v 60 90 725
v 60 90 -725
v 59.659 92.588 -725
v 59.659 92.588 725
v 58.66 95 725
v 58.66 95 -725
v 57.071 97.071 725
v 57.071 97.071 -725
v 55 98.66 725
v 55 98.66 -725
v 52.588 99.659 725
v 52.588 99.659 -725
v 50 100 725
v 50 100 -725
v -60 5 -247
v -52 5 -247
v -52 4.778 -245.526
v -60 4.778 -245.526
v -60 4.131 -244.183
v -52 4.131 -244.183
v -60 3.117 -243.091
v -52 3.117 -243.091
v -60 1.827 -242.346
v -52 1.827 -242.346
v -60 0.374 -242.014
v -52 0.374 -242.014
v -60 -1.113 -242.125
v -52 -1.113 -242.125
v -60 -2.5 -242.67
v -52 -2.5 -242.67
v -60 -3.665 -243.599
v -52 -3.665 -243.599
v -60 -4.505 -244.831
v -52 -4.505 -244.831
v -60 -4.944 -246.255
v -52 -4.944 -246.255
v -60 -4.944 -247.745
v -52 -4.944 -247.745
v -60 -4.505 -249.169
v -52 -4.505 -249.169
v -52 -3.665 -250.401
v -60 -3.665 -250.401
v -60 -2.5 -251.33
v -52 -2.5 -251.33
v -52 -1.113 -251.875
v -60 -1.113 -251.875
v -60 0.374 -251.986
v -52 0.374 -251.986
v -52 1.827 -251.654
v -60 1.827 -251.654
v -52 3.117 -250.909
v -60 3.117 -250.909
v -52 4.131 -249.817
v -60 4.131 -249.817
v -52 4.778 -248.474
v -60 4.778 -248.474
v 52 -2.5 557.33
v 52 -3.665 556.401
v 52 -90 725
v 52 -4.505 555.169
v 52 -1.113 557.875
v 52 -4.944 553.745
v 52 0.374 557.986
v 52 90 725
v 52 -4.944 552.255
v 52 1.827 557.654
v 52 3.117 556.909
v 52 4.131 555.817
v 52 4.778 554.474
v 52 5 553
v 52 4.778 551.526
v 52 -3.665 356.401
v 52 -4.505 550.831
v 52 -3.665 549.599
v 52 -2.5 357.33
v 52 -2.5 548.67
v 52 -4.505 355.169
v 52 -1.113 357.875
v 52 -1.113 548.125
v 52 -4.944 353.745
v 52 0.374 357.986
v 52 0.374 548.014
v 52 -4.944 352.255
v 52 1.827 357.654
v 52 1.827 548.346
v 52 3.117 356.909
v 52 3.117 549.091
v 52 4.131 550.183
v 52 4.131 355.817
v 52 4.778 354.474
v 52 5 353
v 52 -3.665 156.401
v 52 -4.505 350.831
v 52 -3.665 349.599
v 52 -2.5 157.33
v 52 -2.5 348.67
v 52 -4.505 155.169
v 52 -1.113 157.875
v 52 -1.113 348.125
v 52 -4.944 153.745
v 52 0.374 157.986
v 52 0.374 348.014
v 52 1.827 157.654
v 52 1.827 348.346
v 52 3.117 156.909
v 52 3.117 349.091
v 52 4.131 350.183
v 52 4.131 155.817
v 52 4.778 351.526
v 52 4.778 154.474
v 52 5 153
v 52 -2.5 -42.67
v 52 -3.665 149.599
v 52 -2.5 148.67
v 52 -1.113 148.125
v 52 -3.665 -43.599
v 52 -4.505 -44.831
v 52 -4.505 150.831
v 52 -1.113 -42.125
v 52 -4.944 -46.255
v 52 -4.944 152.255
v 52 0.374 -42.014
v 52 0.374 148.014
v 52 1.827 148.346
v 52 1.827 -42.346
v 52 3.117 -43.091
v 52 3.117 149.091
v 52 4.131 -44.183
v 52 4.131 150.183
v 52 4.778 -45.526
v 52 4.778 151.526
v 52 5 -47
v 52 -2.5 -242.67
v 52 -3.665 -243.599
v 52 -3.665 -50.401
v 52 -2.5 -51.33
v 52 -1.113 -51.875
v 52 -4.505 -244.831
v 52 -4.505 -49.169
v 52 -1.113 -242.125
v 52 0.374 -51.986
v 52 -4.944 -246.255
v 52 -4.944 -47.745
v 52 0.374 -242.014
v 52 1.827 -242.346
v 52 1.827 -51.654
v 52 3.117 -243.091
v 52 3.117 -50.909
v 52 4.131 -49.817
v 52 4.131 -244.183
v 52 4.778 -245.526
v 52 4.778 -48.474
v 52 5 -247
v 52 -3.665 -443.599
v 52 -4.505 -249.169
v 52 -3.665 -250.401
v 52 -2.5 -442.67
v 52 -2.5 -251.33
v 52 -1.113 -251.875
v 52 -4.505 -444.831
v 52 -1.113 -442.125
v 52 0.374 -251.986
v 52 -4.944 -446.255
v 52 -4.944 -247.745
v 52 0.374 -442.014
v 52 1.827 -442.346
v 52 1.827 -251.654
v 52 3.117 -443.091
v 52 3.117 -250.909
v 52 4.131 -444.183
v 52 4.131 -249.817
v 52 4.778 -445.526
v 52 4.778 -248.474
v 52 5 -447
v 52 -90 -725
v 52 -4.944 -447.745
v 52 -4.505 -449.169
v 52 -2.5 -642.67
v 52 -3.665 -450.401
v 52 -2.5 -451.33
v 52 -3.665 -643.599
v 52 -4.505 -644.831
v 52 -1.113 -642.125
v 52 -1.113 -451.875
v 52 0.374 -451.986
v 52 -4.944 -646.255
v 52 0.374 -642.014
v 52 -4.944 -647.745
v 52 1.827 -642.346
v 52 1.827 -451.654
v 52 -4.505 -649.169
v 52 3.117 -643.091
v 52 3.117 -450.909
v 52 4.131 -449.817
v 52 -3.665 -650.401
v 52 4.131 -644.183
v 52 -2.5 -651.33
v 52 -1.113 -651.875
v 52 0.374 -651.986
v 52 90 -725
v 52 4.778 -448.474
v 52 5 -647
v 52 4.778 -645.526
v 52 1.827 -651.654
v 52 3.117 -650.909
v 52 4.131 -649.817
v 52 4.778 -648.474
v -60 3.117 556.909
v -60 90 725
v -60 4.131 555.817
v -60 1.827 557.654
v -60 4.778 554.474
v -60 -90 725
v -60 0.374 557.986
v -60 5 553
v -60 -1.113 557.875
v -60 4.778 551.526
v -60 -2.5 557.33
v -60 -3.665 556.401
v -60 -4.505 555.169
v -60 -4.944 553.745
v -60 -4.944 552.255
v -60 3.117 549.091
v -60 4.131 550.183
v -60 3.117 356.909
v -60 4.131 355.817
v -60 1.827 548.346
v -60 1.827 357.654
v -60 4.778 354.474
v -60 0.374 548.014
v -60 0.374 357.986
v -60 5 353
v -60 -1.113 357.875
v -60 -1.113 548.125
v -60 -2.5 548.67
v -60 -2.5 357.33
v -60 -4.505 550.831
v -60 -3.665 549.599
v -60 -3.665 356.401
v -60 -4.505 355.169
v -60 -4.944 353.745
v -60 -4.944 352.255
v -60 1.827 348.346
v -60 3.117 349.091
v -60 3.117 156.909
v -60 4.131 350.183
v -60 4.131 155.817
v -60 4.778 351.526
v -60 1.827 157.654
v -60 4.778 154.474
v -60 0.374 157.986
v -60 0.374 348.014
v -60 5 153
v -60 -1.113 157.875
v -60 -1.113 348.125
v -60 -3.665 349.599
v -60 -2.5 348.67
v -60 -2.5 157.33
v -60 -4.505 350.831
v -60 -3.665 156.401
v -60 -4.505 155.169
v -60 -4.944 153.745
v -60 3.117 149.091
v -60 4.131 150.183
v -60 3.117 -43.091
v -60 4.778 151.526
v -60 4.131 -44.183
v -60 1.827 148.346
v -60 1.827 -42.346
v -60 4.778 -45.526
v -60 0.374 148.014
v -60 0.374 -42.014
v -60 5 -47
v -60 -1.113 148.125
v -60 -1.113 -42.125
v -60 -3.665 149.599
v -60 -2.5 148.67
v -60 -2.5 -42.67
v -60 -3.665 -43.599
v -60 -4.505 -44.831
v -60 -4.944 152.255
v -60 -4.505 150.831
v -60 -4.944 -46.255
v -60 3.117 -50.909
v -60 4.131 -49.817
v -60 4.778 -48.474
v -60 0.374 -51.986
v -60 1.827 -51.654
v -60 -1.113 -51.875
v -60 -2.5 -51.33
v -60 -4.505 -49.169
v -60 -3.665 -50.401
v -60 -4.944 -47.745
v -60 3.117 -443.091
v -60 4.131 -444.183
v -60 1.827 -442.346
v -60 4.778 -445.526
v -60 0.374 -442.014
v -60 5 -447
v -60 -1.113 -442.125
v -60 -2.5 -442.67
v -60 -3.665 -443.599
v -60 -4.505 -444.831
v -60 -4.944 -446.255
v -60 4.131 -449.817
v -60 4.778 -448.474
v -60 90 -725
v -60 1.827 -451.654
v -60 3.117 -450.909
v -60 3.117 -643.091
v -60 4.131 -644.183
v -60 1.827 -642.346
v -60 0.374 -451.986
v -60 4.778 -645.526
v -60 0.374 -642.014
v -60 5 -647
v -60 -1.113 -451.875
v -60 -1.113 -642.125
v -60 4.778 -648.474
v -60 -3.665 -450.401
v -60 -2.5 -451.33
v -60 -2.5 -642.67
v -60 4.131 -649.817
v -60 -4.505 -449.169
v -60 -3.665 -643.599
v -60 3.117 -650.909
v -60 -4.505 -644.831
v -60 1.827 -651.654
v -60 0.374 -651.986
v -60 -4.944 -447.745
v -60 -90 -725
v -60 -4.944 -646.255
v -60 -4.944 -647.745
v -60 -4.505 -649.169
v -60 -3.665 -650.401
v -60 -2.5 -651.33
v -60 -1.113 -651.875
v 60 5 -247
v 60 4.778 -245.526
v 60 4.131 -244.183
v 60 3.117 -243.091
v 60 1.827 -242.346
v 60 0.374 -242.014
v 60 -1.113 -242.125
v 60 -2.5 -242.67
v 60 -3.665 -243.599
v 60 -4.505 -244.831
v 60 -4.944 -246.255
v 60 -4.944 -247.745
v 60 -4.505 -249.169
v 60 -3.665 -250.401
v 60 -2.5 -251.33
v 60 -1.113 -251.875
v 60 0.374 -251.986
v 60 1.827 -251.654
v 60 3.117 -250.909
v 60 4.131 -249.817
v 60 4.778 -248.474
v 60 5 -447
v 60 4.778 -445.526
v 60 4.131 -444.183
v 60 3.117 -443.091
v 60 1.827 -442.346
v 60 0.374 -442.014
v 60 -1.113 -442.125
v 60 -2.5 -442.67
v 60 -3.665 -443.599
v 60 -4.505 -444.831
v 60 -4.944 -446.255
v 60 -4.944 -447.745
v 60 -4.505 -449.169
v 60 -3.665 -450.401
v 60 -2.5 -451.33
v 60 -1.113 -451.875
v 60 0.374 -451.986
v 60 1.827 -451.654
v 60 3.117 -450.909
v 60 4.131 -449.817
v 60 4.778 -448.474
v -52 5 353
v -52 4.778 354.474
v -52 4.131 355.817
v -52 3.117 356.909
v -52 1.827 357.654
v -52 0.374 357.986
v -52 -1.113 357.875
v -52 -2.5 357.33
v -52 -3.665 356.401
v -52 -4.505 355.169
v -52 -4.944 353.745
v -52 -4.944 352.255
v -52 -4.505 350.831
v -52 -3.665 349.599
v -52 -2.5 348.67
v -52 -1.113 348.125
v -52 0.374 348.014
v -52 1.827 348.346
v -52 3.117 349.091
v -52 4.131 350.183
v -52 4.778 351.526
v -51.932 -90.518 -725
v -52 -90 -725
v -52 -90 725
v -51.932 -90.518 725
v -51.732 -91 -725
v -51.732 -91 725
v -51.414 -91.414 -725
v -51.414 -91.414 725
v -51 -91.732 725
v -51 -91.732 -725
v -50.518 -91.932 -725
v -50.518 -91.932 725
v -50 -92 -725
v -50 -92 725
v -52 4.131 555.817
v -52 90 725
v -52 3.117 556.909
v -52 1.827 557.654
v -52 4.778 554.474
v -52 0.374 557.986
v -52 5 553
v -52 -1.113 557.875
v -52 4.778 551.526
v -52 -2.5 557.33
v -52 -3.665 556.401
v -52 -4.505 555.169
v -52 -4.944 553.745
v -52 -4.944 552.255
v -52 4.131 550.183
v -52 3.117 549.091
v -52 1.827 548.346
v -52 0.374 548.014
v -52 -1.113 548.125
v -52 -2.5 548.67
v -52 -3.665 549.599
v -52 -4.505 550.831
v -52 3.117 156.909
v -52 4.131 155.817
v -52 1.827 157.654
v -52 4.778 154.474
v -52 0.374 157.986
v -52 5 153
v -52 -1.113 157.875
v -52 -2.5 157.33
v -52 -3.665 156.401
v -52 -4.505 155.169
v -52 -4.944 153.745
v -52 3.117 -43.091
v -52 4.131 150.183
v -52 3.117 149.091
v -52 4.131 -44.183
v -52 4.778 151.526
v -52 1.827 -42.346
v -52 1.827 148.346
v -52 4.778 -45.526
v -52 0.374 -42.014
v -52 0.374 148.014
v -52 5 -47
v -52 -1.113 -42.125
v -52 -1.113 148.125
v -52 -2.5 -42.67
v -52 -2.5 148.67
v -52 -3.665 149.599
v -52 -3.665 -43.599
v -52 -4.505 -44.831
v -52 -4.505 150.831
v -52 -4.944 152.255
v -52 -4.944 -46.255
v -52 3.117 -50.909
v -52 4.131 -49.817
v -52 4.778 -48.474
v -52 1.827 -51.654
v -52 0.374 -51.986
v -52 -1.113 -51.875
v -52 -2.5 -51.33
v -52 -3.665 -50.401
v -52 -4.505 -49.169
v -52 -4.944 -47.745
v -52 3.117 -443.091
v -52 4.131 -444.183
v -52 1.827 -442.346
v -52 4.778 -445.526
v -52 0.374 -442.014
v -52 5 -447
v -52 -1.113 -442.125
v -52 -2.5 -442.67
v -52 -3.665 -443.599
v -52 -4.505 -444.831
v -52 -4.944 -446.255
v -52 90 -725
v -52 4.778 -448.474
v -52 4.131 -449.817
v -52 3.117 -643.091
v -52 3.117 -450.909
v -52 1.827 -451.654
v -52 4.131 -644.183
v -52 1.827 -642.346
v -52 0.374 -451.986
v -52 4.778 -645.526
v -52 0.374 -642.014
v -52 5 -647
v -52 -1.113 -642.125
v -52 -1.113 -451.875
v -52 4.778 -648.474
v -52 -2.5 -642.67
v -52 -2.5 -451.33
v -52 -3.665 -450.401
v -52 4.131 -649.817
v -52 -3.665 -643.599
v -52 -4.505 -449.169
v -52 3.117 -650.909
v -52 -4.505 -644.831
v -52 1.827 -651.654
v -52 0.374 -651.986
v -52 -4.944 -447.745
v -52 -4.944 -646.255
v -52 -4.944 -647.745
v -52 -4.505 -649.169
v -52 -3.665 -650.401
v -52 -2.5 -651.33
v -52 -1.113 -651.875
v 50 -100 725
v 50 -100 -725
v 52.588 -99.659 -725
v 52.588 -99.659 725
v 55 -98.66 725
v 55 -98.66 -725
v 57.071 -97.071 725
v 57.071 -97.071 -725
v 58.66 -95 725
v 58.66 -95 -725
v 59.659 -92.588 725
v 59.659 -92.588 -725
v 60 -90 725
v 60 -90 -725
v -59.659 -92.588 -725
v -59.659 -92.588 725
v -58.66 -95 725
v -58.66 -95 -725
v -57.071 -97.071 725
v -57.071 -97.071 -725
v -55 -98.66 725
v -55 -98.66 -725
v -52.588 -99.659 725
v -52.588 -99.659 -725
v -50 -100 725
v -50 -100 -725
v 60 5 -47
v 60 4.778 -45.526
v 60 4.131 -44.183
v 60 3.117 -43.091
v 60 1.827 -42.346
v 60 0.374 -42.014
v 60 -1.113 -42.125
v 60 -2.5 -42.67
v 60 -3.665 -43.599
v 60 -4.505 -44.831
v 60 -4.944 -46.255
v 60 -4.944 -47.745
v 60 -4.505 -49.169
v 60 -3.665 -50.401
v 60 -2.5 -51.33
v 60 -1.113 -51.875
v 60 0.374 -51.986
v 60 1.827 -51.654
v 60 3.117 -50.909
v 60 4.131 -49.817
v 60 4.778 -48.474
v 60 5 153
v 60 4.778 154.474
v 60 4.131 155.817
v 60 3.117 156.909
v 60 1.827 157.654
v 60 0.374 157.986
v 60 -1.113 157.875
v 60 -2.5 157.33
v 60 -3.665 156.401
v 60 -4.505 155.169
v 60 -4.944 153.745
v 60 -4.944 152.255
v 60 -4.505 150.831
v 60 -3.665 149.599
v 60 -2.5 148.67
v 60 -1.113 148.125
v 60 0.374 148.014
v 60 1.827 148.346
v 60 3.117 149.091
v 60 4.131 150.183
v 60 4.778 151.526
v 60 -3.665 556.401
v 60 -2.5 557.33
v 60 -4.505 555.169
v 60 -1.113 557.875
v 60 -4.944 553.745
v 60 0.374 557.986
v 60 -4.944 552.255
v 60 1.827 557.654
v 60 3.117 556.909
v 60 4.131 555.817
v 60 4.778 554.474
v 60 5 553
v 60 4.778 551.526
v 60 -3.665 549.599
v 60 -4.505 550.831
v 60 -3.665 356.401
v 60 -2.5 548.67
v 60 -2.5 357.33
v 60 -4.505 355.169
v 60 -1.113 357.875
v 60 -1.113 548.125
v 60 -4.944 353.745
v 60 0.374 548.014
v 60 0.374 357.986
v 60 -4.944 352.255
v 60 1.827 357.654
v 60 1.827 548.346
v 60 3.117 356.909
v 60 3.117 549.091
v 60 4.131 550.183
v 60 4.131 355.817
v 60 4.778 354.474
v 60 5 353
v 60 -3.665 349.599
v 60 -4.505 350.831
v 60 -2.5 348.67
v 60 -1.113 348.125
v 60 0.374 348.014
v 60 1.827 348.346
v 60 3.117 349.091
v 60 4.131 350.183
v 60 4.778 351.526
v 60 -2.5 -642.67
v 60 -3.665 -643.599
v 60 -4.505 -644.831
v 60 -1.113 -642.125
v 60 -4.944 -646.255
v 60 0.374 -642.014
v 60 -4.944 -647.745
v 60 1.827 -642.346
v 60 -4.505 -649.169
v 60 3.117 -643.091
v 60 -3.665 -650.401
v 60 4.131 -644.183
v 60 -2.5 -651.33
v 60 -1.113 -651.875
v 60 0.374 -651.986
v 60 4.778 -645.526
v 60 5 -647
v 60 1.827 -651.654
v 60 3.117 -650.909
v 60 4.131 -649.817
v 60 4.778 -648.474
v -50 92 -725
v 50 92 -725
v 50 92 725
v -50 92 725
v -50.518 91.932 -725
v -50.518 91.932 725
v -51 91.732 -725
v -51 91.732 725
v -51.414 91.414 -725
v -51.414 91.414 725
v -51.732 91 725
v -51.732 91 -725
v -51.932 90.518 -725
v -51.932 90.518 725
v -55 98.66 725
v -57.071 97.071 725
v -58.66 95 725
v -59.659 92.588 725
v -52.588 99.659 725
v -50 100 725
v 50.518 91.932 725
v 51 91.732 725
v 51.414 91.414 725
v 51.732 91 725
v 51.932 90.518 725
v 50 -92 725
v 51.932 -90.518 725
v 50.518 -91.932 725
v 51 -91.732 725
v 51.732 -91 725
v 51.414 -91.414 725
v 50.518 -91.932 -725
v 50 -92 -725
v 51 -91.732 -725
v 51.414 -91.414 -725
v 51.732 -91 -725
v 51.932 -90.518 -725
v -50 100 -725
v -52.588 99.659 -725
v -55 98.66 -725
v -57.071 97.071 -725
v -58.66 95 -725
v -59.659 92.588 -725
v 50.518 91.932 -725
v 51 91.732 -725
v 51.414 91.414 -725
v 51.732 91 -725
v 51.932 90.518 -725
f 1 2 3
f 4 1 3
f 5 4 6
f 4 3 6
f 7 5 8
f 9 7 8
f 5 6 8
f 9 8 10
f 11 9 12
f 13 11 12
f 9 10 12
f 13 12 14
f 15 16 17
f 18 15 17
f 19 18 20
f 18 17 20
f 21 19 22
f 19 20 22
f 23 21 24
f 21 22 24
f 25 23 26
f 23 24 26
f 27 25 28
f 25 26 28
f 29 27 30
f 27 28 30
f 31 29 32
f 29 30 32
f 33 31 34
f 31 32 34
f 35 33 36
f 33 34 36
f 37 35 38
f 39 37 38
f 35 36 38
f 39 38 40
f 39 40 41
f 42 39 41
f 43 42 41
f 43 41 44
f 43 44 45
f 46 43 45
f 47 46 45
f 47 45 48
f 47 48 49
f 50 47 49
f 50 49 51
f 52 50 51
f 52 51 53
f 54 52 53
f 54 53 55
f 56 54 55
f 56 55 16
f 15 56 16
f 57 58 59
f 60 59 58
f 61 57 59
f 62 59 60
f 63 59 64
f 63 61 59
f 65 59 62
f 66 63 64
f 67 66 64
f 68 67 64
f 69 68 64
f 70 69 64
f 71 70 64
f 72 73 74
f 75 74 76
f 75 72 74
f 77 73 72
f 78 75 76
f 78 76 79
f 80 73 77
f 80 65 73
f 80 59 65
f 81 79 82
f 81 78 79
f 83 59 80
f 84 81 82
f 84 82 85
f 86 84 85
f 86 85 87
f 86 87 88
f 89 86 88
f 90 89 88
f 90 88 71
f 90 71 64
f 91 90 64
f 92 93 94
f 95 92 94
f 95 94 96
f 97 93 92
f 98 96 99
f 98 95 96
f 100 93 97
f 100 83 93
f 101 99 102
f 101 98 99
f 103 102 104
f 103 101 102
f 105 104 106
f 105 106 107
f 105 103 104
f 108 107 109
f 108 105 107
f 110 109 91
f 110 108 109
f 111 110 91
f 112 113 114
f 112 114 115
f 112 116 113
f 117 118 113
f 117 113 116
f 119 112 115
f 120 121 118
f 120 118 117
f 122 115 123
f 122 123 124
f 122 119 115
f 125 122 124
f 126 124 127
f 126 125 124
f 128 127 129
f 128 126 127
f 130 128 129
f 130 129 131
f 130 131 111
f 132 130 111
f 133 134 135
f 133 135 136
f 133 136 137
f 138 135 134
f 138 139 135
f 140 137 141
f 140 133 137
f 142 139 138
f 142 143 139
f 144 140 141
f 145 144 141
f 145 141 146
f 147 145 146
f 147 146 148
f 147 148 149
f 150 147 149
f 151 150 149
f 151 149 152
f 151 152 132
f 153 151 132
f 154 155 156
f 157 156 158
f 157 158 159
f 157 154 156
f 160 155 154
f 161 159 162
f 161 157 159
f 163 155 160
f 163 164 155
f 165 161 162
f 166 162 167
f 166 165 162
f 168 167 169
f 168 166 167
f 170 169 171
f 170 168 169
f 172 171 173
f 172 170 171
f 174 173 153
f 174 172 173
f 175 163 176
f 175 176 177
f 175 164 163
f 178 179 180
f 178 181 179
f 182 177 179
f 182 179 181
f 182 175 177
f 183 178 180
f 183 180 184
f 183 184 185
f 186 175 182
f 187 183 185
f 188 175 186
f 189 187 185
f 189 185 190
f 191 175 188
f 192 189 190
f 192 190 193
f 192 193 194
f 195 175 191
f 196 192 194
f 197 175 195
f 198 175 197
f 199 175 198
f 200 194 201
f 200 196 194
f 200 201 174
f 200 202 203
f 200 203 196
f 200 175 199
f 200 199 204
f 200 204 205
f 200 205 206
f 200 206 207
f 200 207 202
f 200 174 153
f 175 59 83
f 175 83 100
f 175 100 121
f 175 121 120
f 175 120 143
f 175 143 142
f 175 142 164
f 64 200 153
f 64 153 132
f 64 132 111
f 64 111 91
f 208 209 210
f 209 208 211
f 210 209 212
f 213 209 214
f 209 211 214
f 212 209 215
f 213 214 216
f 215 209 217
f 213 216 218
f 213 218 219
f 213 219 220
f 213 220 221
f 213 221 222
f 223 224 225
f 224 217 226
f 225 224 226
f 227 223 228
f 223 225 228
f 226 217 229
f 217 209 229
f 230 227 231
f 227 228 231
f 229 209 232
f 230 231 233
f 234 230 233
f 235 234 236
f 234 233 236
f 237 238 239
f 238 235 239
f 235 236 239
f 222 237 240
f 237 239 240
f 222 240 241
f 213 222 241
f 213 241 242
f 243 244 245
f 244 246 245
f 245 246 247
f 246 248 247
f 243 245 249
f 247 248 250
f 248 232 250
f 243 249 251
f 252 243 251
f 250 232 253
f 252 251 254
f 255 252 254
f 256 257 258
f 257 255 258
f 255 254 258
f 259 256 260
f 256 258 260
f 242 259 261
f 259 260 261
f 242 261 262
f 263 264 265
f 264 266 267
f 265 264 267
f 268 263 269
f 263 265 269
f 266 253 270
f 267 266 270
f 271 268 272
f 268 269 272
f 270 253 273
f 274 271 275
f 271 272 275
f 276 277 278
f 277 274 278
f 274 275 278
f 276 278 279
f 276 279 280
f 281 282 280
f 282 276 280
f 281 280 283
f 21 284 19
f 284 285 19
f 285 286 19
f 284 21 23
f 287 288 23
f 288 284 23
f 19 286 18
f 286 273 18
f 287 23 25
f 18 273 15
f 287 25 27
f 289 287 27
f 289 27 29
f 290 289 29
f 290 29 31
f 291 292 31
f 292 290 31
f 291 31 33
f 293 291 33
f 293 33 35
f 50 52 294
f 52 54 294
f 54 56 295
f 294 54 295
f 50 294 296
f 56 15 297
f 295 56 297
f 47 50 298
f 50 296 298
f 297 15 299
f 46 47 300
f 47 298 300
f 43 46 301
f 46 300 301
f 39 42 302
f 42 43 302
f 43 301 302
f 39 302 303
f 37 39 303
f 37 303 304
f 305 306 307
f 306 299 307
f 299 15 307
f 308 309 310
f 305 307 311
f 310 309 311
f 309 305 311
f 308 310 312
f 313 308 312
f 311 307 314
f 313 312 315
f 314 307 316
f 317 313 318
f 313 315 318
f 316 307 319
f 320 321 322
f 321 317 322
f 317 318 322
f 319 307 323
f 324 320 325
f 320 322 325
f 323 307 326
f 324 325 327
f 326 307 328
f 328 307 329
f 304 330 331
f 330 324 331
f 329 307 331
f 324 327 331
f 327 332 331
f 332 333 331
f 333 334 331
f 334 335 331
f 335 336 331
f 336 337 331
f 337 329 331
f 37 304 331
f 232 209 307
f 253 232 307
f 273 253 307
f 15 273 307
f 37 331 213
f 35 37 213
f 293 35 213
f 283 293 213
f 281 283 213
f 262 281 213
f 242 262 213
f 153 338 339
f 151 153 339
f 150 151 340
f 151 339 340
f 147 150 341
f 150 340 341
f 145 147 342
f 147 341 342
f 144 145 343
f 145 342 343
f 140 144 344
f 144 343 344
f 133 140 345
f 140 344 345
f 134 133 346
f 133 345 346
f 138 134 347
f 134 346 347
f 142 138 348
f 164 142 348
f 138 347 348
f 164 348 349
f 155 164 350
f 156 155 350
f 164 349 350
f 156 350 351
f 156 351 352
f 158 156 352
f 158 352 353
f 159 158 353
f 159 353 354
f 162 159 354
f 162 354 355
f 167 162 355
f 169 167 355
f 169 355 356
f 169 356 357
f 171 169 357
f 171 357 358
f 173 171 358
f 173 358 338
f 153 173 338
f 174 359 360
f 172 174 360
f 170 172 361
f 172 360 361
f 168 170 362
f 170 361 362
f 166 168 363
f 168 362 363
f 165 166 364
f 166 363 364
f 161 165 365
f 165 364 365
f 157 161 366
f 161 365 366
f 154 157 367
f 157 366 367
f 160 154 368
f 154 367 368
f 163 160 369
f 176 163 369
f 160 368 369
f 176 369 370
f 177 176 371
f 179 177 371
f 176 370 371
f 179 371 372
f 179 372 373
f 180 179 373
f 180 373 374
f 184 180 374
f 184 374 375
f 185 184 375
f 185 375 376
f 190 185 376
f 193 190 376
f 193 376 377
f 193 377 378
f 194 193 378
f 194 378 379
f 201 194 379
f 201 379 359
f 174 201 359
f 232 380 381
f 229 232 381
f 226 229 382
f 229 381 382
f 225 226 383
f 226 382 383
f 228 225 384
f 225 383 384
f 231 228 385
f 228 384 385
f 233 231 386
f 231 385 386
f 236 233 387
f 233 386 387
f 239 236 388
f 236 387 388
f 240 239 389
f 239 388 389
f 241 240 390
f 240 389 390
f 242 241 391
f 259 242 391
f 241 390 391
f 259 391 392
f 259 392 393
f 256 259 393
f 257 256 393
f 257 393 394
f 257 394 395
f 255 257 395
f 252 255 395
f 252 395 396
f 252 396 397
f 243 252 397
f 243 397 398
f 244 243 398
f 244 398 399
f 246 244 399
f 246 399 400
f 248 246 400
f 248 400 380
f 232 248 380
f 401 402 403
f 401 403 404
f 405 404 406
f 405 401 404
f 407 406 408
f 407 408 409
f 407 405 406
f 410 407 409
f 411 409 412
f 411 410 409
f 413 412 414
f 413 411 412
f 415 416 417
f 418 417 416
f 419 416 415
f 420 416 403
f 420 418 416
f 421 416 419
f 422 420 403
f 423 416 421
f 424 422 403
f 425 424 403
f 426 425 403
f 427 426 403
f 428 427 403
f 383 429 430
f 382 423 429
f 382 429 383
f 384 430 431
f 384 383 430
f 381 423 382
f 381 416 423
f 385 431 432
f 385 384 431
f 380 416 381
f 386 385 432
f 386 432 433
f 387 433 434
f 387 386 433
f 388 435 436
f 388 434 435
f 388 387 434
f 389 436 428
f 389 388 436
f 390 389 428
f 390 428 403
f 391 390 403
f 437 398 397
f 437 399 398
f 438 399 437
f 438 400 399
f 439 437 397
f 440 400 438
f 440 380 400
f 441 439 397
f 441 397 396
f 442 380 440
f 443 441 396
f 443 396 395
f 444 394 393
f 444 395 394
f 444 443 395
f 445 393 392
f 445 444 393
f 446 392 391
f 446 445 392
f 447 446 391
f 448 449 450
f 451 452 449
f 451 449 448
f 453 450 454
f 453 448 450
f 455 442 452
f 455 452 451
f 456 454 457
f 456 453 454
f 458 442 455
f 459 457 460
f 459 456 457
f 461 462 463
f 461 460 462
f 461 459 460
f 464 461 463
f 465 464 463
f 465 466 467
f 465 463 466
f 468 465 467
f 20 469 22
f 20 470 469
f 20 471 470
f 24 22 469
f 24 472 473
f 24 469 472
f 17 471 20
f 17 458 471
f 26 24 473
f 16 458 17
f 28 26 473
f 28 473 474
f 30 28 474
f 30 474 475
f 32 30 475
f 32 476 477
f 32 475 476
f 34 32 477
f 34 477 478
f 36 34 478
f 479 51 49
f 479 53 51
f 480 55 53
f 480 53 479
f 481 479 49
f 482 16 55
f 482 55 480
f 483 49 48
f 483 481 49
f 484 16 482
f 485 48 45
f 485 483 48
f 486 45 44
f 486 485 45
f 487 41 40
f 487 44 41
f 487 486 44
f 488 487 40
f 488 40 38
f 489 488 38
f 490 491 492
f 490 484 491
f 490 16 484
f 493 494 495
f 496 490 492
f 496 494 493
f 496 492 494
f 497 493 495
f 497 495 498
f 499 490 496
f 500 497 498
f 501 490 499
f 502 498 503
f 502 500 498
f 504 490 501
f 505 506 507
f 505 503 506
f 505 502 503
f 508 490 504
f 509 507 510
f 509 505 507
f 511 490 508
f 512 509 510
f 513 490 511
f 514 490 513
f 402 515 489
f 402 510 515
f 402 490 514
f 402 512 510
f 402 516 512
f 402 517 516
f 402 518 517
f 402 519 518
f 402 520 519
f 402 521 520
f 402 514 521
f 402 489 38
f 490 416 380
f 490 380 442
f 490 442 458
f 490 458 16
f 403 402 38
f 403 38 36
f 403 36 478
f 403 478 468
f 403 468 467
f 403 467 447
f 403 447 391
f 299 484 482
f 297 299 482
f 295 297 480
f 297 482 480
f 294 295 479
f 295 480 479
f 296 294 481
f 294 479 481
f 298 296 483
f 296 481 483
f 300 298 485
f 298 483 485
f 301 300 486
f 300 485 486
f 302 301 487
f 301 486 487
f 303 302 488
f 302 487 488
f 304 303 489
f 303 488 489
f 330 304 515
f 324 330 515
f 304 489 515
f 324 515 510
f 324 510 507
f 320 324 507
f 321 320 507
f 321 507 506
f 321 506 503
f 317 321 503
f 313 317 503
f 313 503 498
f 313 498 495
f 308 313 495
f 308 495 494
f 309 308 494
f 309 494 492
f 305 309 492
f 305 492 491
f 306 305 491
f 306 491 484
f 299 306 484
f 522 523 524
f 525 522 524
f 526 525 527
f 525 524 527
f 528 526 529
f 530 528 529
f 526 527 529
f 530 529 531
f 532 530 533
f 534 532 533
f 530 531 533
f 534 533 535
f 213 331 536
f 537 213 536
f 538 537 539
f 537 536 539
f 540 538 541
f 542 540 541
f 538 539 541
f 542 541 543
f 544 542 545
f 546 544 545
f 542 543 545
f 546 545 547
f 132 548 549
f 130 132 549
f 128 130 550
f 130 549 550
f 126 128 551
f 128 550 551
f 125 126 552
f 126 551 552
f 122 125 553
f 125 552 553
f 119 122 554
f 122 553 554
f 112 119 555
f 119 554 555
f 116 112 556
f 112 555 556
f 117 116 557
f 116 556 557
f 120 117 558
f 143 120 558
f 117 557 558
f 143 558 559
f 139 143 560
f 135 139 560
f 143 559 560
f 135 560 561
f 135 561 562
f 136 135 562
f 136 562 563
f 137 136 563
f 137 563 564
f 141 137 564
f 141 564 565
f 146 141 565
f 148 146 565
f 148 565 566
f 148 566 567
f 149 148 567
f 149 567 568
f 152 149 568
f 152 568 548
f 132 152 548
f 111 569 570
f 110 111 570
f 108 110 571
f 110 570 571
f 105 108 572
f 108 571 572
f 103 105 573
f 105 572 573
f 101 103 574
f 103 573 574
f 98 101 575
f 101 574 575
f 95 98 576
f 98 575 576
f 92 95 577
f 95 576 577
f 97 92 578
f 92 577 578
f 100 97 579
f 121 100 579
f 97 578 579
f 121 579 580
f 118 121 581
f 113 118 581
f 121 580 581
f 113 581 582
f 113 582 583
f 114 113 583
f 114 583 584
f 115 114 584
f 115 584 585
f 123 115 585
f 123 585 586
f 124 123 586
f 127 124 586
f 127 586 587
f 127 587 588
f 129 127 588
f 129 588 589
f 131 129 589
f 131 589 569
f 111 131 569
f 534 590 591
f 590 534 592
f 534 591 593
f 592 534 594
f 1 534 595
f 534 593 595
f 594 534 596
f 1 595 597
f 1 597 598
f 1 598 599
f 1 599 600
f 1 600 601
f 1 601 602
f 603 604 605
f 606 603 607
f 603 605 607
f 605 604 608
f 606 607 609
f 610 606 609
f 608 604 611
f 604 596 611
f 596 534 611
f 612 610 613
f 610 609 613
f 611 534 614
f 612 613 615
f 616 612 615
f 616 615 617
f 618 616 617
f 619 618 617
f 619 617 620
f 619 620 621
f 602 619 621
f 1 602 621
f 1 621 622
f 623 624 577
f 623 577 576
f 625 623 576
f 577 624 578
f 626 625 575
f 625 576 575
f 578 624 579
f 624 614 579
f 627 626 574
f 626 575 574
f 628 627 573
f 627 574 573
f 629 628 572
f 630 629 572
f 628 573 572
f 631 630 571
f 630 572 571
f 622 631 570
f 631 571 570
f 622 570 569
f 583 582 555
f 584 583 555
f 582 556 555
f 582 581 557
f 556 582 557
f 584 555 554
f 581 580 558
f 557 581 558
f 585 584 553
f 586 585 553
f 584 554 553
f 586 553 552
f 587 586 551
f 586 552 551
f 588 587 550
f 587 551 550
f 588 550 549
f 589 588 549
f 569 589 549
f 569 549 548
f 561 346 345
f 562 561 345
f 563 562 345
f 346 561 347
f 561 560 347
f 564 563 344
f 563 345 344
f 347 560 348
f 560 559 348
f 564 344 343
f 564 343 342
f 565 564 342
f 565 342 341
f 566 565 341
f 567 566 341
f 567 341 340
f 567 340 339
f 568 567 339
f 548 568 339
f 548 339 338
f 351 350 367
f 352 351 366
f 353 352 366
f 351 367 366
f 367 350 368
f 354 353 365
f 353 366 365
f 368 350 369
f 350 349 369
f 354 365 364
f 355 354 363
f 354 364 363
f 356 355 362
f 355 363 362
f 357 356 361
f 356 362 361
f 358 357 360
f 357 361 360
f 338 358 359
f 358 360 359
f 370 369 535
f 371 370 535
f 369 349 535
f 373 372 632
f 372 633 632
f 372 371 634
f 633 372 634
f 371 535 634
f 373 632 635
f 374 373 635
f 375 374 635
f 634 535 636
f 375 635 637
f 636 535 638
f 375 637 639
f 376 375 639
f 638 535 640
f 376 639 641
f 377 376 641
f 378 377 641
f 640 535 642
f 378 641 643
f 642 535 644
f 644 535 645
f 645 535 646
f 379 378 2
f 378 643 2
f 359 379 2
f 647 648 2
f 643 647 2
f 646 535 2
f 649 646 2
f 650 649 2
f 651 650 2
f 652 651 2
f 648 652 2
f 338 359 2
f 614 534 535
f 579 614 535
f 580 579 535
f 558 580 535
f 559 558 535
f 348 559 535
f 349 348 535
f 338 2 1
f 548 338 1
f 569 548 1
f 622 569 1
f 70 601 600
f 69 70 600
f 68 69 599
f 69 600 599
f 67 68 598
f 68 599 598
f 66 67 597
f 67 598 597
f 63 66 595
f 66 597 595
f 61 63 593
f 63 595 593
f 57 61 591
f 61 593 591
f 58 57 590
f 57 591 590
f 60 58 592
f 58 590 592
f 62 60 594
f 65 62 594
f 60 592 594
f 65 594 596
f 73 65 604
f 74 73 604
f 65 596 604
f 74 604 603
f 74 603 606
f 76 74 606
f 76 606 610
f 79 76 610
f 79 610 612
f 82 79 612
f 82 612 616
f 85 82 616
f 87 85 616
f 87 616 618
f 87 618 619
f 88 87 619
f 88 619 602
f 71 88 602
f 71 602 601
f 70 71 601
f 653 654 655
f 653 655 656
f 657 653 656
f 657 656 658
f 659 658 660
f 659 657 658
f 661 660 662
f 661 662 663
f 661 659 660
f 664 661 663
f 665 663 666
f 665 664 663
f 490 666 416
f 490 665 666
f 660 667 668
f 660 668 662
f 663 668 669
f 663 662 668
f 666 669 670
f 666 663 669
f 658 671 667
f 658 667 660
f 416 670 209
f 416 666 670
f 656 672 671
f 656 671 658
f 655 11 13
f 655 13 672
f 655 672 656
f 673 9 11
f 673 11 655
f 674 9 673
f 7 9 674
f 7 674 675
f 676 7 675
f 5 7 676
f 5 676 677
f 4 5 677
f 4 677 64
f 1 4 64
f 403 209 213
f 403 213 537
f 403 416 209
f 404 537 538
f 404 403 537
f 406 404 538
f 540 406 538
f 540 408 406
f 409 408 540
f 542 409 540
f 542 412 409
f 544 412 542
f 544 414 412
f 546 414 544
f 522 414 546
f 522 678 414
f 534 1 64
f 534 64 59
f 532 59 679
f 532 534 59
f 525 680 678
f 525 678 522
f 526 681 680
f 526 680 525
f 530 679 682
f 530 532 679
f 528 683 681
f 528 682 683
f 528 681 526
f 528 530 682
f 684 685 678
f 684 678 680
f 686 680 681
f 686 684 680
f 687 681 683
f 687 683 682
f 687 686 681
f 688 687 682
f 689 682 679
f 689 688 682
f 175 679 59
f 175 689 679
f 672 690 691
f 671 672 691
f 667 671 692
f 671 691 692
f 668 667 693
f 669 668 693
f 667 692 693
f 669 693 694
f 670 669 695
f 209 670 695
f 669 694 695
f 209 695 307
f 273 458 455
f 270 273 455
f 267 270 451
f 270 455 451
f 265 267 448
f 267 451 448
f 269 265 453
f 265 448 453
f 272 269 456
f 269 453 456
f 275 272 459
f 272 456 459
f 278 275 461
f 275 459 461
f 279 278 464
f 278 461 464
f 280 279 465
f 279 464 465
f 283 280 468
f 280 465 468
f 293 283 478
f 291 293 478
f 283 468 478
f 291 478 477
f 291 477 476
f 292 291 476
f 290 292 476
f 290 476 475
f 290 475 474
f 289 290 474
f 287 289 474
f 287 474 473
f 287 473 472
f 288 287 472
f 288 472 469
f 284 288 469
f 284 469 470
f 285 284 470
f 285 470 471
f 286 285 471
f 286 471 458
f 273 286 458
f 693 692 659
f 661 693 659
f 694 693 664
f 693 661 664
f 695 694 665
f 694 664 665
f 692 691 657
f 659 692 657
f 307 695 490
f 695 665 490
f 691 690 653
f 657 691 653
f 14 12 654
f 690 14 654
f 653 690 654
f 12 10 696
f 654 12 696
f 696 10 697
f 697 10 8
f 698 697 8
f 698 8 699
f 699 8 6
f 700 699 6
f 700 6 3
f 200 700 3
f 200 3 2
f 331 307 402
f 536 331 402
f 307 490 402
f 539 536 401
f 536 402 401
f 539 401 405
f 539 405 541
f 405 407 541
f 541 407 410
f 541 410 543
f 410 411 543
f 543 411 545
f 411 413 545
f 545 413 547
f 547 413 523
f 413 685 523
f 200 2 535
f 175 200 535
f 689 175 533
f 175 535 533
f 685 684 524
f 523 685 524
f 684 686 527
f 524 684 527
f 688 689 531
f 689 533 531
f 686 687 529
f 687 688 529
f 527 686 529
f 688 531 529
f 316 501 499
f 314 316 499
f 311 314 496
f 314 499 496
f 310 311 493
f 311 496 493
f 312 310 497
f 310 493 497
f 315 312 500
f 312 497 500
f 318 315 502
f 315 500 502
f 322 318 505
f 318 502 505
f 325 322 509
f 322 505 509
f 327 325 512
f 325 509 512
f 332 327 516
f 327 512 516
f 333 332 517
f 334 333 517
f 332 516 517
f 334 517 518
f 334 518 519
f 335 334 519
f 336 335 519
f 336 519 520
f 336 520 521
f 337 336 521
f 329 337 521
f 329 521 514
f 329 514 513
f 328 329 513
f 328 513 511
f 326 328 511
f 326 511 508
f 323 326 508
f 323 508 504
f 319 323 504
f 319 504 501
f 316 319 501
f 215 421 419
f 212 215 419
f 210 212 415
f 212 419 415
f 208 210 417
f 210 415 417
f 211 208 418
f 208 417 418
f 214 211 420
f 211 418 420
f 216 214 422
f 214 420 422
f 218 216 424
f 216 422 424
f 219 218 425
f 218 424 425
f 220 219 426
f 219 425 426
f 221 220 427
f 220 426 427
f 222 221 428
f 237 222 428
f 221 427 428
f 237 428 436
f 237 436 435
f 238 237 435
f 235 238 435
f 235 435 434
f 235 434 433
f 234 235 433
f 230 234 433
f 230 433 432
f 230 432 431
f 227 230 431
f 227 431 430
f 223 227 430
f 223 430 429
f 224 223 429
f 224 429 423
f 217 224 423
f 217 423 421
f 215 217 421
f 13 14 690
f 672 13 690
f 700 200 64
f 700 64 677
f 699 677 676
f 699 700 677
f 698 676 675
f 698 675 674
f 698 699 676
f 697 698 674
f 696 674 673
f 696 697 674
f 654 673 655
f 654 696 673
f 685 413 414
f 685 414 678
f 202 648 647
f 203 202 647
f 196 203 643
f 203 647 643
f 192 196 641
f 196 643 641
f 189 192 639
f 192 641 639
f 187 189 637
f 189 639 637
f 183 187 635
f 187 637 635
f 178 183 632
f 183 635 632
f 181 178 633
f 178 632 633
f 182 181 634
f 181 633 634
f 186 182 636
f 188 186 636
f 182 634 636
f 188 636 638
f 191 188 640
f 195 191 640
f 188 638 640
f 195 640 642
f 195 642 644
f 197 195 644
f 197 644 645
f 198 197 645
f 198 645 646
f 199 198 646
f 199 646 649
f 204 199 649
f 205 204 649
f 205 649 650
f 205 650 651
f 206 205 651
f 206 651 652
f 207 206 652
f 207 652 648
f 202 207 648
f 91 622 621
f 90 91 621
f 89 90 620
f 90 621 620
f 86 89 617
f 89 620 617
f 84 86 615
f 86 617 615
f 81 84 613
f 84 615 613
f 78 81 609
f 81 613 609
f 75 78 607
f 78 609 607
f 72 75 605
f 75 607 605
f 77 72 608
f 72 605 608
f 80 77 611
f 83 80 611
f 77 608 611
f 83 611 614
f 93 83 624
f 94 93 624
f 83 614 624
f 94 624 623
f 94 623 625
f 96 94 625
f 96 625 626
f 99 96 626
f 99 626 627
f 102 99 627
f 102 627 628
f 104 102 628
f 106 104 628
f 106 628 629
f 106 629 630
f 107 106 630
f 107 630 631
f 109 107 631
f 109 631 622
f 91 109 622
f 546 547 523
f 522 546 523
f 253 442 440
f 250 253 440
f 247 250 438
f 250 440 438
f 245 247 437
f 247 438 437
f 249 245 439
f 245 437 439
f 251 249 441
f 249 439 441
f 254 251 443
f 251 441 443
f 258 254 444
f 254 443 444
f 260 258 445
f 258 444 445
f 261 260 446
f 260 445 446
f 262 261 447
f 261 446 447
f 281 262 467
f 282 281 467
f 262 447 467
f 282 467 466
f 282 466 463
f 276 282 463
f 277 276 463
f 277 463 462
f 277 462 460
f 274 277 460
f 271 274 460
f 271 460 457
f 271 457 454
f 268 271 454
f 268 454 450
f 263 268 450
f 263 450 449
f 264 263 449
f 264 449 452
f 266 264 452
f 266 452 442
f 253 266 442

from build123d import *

# Parameters (mm, degrees)
TUBE_SQUARE_TS3X3X0_3125_1_DEPTH = 1450
SKETCH7_R                        = 5
CUT_EXTRUDE1_DEPTH               = 742.636703515


with BuildPart() as part:
    # Sketch1 → Tube square TS3X3X0.3125(1) (new body)
    with BuildSketch(Plane(origin=(0, 0, -725), x_dir=(0, -1, 0), z_dir=(0, 0, 1))):
        with BuildLine():
            Line((-90, -60), (90, -60))
            ThreePointArc((90, -60), (97.071067812, -57.071067812), (100, -50))
            Line((100, -50), (100, 50))
            ThreePointArc((100, 50), (97.071067812, 57.071067812), (90, 60))
            Line((90, 60), (-90, 60))
            ThreePointArc((-90, 60), (-97.071067812, 57.071067812), (-100, 50))
            Line((-100, 50), (-100, -50))
            ThreePointArc((-100, -50), (-97.071067812, -57.071067812), (-90, -60))
        make_face()
        with BuildLine():
            Line((-90, -52), (90, -52))
            ThreePointArc((90, -52), (91.414213562, -51.414213562), (92, -50))
            Line((92, -50), (92, 50))
            ThreePointArc((92, 50), (91.414213562, 51.414213562), (90, 52))
            Line((90, 52), (-90, 52))
            ThreePointArc((-90, 52), (-91.414213562, 51.414213562), (-92, 50))
            Line((-92, 50), (-92, -50))
            ThreePointArc((-92, -50), (-91.414213562, -51.414213562), (-90, -52))
        make_face(mode=Mode.SUBTRACT)
    extrude(amount=TUBE_SQUARE_TS3X3X0_3125_1_DEPTH)

    # Sketch7 → Cut-Extrude1 (cut, through all)
    with BuildSketch(Plane(origin=(60, 0, 0), x_dir=(0, 0, -1), z_dir=(1, 0, 0))):
        with Locations(Location((647, 0, 0), (0, 0, 90))):
            Circle(SKETCH7_R)
        with Locations(Location((447, 0, 0), (0, 0, 90))):
            Circle(SKETCH7_R)
        with Locations(Location((247, 0, 0), (0, 0, 90))):
            Circle(SKETCH7_R)
        with Locations(Location((47, 0, 0), (0, 0, 90))):
            Circle(SKETCH7_R)
        with Locations(Location((-153, 0, 0), (0, 0, 90))):
            Circle(SKETCH7_R)
        with Locations(Location((-353, 0, 0), (0, 0, 90))):
            Circle(SKETCH7_R)
        with Locations(Location((-553, 0, 0), (0, 0, 90))):
            Circle(SKETCH7_R)
    extrude(amount=-CUT_EXTRUDE1_DEPTH, mode=Mode.SUBTRACT)


solid = part.part
